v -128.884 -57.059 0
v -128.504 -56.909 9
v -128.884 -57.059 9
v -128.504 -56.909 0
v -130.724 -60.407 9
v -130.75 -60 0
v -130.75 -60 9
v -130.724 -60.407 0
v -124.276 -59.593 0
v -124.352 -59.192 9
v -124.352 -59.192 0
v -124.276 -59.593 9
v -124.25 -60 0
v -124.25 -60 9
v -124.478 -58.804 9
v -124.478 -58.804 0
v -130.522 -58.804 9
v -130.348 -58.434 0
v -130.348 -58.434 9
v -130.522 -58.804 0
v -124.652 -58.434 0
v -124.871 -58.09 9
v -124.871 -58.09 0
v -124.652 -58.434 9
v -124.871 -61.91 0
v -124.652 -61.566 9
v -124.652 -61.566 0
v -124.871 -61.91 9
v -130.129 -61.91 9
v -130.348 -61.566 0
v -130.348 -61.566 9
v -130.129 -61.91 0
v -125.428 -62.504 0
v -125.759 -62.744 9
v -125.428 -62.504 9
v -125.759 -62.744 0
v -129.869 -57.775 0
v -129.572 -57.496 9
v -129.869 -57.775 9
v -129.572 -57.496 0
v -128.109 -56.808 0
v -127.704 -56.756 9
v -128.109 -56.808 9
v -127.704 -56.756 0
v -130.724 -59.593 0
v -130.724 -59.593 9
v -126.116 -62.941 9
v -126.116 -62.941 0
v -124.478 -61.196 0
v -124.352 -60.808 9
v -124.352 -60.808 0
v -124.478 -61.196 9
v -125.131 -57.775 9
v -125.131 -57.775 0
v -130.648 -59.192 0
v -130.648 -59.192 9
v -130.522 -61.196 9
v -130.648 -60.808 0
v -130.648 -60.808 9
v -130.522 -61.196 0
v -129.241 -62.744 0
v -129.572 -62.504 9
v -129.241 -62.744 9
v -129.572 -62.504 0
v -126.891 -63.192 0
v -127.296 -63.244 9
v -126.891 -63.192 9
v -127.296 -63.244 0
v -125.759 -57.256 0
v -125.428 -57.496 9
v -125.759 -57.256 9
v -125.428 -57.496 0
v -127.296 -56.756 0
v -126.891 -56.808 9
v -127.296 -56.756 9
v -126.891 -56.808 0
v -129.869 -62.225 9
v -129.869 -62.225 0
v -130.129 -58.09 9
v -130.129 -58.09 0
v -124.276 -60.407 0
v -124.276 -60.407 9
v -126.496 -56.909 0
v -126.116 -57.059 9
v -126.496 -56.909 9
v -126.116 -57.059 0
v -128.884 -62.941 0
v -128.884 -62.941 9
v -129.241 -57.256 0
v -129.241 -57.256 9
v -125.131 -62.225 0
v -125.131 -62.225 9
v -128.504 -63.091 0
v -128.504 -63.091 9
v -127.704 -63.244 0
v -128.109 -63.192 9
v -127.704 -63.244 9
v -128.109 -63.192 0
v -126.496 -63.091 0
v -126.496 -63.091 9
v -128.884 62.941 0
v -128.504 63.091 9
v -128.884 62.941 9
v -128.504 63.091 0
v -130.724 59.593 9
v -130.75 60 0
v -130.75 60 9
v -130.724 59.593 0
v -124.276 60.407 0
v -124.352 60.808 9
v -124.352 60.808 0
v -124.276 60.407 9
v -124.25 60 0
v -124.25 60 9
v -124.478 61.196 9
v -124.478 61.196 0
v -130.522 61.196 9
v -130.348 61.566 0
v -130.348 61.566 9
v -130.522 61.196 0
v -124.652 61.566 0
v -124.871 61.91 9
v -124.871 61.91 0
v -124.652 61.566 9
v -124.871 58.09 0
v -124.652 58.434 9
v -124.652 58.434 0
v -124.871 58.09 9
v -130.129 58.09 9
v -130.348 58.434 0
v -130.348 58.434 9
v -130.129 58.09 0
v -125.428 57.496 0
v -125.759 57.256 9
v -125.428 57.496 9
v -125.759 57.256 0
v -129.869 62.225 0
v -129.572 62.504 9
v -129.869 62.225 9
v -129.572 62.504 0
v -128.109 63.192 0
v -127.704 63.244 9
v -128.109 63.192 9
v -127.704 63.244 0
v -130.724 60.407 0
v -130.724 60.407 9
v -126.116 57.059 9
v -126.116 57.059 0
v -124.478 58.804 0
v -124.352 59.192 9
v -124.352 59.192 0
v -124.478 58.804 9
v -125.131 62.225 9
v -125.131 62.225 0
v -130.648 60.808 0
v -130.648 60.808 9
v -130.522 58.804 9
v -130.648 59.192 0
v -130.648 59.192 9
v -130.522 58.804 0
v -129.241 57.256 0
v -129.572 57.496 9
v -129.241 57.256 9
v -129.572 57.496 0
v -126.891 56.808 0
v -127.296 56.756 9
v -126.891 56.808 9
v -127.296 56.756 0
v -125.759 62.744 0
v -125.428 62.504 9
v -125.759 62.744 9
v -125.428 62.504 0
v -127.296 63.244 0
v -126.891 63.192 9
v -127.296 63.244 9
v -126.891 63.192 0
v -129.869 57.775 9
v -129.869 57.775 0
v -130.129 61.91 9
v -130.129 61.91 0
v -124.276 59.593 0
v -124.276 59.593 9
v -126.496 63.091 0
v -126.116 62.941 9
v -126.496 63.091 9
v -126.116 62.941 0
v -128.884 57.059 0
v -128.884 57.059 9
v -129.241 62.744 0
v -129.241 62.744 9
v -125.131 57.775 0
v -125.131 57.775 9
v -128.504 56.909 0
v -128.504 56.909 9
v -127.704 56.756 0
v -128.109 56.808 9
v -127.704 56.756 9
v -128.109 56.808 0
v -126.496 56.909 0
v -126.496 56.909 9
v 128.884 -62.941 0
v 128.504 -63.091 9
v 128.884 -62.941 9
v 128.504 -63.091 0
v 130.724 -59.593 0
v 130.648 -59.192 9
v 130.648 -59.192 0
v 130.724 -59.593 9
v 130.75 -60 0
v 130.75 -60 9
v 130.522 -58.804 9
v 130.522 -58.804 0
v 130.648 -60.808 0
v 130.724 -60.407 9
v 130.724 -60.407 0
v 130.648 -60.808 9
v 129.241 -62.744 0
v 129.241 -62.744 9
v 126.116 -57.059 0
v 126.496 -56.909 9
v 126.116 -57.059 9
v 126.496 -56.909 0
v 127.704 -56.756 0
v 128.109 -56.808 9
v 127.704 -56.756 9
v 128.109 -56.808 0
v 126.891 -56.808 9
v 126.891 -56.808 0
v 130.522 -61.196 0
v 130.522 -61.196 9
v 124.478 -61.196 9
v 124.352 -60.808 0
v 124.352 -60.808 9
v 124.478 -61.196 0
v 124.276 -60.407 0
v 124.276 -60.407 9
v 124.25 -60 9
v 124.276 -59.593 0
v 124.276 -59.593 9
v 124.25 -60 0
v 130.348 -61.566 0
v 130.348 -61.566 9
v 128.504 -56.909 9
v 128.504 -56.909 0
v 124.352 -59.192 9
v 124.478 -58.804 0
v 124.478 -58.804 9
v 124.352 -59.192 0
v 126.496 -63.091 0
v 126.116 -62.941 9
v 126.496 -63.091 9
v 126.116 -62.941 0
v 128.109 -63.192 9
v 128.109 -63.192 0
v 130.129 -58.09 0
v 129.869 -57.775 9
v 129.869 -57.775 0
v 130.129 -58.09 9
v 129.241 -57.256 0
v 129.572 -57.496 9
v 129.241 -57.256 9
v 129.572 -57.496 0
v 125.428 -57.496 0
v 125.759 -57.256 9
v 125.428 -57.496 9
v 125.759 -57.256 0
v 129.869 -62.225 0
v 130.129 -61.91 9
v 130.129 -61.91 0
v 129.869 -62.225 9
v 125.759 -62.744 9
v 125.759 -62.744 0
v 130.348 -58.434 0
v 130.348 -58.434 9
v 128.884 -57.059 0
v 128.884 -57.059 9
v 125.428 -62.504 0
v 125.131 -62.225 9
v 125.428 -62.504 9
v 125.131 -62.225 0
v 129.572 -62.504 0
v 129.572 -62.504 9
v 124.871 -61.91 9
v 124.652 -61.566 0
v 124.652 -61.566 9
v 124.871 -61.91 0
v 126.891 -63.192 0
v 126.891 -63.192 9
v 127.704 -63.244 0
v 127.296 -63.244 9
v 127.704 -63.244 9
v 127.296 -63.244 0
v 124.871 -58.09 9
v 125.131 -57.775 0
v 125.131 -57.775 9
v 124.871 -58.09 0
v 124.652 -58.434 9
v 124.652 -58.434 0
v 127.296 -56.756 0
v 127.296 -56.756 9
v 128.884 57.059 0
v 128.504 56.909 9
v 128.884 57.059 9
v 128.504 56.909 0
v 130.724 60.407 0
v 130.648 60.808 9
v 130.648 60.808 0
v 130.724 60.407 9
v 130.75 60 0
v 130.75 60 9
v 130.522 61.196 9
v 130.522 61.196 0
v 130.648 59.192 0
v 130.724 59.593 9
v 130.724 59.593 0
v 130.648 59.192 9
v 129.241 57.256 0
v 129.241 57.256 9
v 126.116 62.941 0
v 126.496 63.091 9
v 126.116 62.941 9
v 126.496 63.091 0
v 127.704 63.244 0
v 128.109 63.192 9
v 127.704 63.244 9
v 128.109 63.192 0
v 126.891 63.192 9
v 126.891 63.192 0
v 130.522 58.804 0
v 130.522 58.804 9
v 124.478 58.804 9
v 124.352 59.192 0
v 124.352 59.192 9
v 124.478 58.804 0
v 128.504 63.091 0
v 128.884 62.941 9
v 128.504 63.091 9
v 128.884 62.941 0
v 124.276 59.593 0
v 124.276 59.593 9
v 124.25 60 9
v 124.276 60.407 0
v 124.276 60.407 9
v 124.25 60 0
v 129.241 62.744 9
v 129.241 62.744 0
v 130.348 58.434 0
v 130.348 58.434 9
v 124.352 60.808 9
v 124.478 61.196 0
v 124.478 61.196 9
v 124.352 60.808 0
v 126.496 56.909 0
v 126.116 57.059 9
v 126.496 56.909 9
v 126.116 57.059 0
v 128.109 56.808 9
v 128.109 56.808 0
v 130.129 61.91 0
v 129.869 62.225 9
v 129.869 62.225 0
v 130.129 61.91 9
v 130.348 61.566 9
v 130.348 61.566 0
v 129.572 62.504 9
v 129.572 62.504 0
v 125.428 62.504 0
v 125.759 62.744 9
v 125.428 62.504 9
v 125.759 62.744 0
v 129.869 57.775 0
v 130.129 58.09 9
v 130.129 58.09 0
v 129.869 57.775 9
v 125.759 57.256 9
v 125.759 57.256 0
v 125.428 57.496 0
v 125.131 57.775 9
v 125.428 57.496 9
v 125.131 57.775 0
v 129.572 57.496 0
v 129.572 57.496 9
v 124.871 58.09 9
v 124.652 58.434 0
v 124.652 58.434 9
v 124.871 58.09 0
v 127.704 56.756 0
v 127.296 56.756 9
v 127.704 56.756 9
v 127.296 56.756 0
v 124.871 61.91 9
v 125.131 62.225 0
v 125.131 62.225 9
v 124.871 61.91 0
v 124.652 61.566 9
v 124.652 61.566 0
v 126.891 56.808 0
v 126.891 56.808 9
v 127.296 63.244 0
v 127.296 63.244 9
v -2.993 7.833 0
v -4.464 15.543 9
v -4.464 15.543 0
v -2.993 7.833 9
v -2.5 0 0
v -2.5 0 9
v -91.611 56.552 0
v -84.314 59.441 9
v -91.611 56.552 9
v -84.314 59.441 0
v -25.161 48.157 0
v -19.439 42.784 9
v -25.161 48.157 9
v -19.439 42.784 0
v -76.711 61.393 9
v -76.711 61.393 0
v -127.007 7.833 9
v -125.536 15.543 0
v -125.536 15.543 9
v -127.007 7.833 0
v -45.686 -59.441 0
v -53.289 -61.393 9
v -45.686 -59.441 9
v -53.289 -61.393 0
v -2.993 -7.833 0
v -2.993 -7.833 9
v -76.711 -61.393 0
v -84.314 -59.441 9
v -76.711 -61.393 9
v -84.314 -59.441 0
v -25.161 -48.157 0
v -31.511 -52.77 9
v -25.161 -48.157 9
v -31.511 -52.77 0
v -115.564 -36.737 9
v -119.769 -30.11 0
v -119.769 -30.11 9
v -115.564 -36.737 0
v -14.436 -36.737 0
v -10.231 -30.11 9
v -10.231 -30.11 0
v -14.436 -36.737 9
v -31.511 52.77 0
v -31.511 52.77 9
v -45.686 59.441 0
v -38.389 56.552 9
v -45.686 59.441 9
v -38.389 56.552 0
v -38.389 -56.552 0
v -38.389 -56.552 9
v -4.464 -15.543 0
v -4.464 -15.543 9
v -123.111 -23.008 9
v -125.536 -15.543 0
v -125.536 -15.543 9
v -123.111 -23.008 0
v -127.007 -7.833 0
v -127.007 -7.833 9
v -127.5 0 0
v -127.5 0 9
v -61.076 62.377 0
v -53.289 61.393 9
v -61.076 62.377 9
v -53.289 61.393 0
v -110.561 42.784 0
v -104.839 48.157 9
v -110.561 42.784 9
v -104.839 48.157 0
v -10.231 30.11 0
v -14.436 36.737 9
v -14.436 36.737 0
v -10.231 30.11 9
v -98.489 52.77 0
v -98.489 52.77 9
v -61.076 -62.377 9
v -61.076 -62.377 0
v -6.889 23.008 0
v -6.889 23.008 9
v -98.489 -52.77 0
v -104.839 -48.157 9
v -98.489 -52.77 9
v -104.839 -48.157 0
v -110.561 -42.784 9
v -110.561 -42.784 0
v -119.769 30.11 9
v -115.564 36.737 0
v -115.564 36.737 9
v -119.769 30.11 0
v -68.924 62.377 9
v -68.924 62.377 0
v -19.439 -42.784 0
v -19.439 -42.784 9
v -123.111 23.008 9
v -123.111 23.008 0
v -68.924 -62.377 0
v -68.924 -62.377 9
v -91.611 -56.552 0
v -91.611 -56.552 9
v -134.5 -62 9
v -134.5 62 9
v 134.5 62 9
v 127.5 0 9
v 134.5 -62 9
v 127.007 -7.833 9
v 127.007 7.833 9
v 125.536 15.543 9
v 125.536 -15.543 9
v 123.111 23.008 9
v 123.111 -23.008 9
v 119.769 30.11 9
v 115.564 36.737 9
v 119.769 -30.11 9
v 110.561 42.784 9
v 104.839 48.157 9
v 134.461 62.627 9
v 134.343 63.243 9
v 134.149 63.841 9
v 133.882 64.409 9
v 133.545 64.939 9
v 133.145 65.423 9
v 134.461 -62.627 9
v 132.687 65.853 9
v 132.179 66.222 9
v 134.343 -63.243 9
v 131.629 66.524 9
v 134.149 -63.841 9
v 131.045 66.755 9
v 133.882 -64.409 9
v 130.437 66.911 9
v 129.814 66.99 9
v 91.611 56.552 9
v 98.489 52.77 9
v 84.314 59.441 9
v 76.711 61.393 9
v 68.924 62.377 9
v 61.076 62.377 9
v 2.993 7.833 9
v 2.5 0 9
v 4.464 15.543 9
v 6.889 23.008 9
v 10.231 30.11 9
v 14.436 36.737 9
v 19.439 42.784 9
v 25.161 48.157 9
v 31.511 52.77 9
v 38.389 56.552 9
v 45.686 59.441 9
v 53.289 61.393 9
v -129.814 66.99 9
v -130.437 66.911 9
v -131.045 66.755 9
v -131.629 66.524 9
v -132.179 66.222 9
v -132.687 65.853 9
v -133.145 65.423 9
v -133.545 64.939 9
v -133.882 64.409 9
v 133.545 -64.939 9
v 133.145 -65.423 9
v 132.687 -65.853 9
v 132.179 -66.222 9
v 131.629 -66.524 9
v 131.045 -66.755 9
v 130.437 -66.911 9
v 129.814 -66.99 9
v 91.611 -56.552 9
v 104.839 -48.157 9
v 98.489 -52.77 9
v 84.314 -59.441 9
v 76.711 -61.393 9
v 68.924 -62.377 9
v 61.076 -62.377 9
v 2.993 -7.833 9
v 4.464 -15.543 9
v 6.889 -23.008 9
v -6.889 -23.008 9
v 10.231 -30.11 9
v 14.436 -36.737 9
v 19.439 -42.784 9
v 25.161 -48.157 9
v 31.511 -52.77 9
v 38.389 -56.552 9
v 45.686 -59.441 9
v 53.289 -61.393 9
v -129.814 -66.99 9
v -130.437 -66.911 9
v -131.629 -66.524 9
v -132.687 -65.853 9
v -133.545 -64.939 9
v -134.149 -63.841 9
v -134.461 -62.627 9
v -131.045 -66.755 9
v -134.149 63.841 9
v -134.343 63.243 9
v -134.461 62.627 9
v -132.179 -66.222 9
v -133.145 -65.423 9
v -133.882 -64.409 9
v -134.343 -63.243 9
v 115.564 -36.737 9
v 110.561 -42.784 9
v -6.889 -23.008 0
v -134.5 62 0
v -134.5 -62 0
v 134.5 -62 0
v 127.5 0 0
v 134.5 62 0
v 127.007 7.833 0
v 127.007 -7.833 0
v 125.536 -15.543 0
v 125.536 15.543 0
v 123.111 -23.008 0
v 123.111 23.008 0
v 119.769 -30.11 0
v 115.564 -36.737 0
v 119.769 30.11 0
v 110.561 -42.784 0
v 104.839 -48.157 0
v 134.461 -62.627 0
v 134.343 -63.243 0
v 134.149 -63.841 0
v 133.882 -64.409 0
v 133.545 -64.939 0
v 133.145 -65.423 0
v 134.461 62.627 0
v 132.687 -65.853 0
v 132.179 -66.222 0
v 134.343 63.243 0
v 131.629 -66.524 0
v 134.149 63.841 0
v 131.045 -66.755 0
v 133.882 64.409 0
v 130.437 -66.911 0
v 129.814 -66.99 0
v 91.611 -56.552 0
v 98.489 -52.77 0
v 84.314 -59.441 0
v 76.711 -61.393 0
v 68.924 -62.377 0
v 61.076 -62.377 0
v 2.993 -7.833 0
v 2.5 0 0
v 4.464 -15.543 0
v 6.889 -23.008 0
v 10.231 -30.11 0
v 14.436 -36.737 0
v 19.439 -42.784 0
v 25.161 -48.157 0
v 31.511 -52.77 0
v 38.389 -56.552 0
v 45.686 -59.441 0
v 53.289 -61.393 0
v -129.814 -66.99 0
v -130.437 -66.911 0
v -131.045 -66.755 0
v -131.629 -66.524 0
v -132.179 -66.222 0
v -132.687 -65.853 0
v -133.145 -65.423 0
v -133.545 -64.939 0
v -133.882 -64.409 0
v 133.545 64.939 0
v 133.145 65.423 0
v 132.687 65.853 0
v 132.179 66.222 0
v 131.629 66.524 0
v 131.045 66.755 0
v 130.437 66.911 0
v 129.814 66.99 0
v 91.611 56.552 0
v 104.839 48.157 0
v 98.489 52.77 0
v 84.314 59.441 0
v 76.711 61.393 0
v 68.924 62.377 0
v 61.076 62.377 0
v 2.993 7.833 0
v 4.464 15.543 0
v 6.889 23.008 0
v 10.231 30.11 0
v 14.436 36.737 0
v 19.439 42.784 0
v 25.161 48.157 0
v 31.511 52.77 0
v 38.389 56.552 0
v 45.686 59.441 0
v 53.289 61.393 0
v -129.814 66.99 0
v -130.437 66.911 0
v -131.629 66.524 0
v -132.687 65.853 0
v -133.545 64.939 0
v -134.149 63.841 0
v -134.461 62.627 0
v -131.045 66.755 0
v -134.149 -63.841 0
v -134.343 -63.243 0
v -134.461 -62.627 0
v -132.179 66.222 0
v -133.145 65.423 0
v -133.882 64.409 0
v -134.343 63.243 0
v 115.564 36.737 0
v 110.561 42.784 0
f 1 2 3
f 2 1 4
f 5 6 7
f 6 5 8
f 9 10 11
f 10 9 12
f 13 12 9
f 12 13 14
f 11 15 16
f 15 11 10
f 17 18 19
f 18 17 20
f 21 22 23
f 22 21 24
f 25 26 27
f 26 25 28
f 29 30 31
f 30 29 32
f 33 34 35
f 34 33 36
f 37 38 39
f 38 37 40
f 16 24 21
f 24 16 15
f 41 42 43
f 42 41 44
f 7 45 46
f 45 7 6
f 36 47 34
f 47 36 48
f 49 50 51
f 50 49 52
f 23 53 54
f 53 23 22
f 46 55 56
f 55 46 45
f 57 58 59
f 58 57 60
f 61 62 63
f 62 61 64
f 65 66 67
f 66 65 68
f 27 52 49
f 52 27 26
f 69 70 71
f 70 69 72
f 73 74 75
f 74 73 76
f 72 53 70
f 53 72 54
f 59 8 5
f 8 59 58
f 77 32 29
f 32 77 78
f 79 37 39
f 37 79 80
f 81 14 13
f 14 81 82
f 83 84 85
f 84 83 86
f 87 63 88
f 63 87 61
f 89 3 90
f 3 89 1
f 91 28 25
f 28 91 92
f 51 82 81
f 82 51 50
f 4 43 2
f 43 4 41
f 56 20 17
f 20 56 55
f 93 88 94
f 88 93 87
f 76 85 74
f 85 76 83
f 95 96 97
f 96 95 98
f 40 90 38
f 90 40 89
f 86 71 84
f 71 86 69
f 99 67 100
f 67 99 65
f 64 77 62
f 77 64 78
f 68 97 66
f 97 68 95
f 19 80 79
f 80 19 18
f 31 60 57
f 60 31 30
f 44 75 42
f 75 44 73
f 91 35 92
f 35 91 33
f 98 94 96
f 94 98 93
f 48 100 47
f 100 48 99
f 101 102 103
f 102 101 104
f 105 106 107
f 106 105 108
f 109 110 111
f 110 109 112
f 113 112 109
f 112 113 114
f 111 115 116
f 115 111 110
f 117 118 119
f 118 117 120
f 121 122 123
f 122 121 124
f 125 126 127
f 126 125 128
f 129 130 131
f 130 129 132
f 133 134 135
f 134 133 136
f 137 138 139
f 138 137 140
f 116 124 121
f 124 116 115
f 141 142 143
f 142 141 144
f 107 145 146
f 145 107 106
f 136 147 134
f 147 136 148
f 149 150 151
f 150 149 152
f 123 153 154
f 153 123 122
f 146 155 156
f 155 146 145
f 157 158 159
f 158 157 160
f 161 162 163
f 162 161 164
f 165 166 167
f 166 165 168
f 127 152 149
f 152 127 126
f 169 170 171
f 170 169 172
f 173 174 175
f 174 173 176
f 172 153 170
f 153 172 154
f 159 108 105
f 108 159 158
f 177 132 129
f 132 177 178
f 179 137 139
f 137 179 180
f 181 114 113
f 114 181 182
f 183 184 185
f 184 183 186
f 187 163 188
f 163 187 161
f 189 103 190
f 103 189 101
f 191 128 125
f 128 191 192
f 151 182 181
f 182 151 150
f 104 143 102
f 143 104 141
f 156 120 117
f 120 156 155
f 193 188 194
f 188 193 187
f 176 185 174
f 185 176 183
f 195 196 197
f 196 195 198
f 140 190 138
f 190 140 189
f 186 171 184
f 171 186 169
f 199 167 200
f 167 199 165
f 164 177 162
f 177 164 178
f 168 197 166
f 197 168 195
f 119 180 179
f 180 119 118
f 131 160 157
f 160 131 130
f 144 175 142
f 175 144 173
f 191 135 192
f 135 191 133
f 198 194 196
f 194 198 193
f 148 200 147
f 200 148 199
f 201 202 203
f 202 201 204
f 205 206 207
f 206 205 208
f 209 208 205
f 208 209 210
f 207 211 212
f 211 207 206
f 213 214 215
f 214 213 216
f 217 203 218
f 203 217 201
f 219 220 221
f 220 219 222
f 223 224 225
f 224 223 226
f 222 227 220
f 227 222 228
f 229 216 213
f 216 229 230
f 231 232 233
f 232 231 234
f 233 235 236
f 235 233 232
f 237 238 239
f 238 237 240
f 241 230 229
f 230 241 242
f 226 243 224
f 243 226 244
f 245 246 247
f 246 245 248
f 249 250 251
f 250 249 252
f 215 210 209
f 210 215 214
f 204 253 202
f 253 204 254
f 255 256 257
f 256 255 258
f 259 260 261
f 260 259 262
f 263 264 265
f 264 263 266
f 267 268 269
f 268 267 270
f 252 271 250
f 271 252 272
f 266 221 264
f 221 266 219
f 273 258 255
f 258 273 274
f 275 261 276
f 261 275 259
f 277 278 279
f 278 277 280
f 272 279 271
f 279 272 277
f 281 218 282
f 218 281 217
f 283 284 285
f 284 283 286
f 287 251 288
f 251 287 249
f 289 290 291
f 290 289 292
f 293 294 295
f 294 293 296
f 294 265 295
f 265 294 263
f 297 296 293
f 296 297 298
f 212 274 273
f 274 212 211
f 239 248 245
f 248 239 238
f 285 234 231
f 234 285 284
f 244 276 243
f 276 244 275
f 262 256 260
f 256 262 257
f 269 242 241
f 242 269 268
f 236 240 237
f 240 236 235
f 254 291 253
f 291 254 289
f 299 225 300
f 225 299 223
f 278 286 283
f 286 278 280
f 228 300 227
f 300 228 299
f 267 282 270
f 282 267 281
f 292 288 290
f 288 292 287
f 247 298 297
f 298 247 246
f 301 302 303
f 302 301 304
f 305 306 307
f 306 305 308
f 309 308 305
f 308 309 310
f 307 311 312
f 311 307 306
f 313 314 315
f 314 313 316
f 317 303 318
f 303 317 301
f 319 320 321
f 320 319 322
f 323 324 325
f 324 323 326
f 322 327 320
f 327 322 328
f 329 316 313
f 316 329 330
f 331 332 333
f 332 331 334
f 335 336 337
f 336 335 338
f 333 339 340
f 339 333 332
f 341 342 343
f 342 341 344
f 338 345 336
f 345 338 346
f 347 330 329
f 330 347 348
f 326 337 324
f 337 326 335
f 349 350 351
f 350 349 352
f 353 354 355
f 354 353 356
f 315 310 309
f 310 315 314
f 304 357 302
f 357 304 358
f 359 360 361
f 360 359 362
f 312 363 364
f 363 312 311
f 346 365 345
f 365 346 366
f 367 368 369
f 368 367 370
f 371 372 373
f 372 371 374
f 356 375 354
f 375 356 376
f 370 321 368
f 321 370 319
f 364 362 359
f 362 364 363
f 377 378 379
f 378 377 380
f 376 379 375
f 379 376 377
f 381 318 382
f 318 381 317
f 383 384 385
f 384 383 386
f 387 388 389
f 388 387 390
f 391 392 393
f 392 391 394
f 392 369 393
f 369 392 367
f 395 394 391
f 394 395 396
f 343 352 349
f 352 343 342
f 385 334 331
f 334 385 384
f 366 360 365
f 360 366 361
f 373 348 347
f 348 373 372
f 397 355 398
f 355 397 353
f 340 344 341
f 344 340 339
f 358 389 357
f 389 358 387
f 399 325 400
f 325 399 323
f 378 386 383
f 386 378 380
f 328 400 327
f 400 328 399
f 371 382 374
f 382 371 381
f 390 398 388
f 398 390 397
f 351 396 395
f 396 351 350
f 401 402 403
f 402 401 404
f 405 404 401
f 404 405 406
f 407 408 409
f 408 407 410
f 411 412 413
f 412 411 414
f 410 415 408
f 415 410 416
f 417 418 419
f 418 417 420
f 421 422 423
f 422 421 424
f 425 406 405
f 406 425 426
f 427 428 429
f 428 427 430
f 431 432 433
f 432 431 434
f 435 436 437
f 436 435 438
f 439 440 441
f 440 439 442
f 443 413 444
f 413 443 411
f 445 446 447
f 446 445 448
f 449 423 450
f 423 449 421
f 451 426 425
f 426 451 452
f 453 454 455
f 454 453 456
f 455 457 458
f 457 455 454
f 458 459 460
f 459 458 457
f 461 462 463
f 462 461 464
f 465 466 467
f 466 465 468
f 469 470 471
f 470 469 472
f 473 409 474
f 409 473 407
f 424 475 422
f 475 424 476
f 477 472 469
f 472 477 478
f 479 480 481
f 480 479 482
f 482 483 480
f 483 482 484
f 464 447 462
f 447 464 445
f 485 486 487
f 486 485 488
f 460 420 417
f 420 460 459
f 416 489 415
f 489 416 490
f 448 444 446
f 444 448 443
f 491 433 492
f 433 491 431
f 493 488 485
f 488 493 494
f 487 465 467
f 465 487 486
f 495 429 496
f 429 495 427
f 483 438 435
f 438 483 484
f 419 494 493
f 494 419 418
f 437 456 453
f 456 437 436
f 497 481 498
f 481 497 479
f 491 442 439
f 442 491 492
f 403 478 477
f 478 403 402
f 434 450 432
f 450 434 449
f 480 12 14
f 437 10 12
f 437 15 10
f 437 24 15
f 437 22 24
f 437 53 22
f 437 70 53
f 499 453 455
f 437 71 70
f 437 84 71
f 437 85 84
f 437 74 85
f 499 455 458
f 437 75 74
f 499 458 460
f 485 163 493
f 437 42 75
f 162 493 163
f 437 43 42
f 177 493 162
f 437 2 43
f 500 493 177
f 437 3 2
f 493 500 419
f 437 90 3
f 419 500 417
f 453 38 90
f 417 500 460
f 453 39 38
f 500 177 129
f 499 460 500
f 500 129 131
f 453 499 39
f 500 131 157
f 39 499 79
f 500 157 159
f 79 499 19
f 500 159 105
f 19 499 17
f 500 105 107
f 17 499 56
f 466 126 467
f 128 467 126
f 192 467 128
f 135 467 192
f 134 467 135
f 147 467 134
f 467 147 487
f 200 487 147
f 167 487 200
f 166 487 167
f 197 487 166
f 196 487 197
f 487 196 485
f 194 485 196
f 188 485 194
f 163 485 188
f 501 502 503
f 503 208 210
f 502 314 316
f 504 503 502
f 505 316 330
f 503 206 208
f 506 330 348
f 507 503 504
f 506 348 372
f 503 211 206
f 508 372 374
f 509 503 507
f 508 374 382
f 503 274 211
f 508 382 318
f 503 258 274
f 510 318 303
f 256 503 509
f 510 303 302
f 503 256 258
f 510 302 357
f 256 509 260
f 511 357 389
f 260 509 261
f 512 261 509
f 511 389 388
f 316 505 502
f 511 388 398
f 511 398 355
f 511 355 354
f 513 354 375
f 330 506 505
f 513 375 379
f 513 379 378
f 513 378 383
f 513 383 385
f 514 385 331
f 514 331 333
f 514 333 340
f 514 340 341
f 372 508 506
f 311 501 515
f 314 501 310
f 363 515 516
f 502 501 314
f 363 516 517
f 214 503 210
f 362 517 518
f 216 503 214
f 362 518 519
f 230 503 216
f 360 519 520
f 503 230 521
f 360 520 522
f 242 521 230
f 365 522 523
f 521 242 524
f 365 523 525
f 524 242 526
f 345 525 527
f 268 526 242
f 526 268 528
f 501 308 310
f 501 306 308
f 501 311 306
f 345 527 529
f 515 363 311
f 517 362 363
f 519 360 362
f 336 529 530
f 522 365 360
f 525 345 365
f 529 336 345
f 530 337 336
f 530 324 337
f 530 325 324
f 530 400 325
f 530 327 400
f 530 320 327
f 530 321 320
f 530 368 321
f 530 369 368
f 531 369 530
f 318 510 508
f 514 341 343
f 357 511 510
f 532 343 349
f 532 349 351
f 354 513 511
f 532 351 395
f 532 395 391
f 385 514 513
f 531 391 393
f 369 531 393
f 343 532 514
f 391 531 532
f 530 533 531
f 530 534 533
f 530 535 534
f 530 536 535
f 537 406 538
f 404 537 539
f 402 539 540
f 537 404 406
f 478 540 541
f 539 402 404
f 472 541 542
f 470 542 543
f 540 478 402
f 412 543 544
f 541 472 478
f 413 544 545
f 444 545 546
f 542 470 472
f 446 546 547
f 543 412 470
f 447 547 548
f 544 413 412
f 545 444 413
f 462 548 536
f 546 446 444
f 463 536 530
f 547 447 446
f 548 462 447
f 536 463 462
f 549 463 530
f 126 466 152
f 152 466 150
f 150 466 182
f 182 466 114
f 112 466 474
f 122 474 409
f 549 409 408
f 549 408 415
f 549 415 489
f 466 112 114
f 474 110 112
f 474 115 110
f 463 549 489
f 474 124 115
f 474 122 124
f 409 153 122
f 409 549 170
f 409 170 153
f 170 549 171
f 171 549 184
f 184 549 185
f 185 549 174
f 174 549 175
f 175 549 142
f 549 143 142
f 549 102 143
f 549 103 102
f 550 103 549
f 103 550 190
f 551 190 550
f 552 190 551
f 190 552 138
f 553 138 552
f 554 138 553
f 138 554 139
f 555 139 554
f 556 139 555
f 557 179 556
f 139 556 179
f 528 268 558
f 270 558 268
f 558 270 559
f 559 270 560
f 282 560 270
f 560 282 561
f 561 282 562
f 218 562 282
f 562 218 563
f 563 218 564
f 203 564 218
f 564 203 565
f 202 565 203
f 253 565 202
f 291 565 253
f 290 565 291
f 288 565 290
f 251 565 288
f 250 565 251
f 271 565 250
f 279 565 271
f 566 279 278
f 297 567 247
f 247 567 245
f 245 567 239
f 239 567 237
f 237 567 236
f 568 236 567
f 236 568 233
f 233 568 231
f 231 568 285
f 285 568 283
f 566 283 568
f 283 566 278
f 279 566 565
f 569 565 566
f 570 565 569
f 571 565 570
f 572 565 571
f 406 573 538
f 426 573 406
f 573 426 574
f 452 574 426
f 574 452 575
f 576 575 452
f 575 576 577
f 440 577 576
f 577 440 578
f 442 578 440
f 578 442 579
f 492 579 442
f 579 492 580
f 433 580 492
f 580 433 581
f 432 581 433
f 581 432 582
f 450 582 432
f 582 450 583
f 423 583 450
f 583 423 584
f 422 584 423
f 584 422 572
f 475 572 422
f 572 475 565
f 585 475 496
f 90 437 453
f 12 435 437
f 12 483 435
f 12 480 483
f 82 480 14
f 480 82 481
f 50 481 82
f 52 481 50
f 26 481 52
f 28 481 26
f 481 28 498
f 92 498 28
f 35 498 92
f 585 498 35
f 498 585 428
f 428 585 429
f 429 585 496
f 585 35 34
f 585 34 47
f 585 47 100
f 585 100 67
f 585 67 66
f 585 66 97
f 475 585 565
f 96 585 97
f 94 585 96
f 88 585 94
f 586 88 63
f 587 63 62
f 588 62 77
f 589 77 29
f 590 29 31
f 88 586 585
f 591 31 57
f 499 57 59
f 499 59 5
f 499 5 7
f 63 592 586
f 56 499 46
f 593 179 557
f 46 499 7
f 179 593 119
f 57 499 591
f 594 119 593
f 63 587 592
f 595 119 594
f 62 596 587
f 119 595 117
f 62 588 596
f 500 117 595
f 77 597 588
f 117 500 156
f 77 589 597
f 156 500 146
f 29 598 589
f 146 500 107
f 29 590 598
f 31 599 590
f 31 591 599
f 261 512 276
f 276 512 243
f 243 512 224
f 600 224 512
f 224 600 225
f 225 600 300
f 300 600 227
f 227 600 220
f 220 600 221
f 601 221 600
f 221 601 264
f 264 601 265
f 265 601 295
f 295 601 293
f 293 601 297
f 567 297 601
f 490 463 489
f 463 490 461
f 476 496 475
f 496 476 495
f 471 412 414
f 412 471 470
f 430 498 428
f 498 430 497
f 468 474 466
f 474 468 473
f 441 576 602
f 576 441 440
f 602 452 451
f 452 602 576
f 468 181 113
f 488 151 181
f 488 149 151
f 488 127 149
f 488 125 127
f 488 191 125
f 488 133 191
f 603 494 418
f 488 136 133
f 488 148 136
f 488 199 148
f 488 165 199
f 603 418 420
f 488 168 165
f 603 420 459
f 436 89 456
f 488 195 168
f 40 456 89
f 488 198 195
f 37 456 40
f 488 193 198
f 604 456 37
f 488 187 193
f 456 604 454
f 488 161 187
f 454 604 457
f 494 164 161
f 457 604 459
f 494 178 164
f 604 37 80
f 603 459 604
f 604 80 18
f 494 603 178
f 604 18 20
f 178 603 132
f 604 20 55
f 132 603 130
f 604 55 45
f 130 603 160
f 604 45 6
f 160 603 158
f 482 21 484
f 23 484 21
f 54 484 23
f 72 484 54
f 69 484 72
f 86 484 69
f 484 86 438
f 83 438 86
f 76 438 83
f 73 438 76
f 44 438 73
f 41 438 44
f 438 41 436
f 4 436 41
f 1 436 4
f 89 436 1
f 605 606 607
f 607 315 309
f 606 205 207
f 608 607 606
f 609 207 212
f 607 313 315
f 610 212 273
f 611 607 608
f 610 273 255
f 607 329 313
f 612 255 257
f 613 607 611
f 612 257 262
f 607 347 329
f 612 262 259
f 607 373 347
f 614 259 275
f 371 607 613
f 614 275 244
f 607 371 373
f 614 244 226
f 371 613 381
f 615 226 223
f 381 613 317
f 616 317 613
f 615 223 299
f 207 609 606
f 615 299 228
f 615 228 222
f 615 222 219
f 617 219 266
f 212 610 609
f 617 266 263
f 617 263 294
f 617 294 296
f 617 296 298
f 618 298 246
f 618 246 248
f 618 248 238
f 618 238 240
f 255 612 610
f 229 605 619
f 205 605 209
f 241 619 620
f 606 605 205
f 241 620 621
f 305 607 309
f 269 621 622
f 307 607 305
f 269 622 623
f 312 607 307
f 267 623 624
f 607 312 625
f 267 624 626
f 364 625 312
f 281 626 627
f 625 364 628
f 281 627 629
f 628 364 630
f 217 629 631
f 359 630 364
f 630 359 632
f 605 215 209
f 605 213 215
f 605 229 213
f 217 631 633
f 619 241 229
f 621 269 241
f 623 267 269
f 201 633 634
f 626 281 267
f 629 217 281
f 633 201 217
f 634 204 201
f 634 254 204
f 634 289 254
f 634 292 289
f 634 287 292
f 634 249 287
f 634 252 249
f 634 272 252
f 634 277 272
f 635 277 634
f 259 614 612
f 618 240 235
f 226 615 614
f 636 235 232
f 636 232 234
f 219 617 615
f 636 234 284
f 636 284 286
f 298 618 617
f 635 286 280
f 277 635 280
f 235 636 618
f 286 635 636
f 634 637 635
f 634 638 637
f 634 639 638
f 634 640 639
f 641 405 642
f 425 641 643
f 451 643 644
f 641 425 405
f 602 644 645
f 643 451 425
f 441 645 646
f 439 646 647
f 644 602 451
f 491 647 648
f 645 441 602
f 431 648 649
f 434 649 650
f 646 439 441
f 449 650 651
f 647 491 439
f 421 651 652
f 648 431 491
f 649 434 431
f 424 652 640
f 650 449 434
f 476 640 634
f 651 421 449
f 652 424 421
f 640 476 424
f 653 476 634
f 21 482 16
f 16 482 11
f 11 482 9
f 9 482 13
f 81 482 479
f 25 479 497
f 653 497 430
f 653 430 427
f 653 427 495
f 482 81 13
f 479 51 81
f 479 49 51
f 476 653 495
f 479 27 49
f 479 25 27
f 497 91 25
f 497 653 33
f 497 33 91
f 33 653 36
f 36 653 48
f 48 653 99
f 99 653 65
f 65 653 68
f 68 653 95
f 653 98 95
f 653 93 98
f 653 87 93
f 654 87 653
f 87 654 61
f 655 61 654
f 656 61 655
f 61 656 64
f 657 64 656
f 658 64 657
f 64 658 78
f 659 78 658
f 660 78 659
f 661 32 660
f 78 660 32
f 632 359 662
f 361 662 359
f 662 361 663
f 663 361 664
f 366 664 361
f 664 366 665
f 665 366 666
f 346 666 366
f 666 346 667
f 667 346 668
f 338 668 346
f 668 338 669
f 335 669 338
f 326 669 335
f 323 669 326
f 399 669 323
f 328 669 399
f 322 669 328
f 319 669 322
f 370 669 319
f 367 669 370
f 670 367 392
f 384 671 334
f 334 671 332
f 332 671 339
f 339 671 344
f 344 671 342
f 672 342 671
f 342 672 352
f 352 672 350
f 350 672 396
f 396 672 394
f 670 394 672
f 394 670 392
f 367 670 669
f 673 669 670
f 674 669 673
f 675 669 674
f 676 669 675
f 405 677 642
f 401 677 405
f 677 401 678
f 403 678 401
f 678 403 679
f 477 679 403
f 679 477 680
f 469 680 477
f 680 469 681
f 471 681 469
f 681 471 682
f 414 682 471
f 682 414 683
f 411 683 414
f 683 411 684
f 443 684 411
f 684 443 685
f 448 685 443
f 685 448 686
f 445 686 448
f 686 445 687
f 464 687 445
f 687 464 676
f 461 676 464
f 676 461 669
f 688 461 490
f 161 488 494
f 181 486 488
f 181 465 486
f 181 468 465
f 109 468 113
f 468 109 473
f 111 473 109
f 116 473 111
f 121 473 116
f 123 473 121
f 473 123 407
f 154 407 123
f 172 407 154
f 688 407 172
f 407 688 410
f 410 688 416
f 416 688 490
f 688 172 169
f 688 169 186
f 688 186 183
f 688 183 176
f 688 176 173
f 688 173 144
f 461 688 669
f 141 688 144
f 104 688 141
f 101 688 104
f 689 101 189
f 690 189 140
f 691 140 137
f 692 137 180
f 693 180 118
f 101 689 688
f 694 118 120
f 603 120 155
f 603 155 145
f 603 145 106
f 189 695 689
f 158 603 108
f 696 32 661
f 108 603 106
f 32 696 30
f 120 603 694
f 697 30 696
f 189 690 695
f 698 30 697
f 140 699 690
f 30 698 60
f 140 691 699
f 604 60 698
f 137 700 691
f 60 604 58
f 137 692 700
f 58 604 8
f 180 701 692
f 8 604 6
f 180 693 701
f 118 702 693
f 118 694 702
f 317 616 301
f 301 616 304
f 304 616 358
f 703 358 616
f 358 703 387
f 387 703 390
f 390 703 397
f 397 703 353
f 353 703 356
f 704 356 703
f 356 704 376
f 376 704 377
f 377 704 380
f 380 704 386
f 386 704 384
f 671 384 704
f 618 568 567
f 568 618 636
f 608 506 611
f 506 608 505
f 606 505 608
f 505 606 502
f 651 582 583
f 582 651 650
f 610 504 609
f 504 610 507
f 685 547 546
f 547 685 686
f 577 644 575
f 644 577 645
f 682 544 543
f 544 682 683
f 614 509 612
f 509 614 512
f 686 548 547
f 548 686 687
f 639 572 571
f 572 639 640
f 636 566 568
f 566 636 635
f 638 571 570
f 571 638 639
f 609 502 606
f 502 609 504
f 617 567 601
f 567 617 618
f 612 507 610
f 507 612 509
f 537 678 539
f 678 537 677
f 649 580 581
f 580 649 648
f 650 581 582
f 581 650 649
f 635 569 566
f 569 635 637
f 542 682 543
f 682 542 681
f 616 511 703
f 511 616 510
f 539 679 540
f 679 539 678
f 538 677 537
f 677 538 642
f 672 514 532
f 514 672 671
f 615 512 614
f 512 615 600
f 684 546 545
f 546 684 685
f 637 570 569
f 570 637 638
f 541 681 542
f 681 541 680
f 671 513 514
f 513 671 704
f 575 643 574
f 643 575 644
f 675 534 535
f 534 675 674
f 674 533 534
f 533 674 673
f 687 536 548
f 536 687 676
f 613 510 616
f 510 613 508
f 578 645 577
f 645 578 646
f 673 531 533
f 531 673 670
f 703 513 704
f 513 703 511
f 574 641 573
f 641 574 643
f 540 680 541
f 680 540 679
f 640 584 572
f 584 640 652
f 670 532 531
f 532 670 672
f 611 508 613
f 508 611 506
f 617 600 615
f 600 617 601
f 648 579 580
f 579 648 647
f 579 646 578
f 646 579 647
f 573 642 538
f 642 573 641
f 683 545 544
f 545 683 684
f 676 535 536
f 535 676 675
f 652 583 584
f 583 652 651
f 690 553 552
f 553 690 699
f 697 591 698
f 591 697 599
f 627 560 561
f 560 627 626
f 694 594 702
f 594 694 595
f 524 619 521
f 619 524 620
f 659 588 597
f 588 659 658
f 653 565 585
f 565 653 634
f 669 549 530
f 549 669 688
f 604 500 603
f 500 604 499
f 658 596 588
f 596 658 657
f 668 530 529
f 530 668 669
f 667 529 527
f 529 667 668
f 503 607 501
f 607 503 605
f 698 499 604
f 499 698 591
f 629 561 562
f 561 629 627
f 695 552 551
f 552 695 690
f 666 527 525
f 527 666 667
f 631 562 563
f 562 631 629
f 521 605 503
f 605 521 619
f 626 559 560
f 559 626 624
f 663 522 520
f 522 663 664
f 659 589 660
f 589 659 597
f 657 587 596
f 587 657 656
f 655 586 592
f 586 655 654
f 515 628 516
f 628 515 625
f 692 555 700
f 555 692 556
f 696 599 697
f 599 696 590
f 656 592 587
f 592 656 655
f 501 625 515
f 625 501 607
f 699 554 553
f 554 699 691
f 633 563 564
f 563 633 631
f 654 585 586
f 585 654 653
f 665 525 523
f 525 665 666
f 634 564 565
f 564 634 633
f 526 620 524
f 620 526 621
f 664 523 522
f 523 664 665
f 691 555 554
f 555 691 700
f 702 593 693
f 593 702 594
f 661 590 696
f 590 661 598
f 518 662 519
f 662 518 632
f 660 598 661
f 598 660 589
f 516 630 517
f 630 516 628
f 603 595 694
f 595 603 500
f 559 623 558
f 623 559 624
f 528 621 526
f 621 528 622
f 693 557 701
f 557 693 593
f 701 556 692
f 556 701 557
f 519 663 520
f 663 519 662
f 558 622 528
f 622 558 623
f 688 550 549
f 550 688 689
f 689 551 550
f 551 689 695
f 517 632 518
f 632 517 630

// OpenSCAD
$fn = 50;

difference() {
	union() {
		hull() {
			translate(v = [-129.5, 62.0, 0]) {
				cylinder(h = 9, r = 5);
			}
			translate(v = [129.5, 62.0, 0]) {
				cylinder(h = 9, r = 5);
			}
			translate(v = [-129.5, -62.0, 0]) {
				cylinder(h = 9, r = 5);
			}
			translate(v = [129.5, -62.0, 0]) {
				cylinder(h = 9, r = 5);
			}
		}
	}
	union() {
		translate(v = [-127.5, -60.0, -100.0]) {
			cylinder(h = 200, r = 3.25);
		}
		translate(v = [-127.5, 60.0, -100.0]) {
			cylinder(h = 200, r = 3.25);
		}
		translate(v = [127.5, -60.0, -100.0]) {
			cylinder(h = 200, r = 3.25);
		}
		translate(v = [127.5, 60.0, -100.0]) {
			cylinder(h = 200, r = 3.25);
		}
		translate(v = [-127.5, -60.0, -100.0]) {
			cylinder(h = 200, r = 1.8);
		}
		translate(v = [-127.5, 60.0, -100.0]) {
			cylinder(h = 200, r = 1.8);
		}
		translate(v = [127.5, -60.0, -100.0]) {
			cylinder(h = 200, r = 1.8);
		}
		translate(v = [127.5, 60.0, -100.0]) {
			cylinder(h = 200, r = 1.8);
		}
		translate(v = [-65.0, 0, 0.0]) {
			cylinder(h = 9, r = 62.5);
		}
		translate(v = [65.0, 0, 0.0]) {
			cylinder(h = 9, r = 62.5);
		}
	}
}
